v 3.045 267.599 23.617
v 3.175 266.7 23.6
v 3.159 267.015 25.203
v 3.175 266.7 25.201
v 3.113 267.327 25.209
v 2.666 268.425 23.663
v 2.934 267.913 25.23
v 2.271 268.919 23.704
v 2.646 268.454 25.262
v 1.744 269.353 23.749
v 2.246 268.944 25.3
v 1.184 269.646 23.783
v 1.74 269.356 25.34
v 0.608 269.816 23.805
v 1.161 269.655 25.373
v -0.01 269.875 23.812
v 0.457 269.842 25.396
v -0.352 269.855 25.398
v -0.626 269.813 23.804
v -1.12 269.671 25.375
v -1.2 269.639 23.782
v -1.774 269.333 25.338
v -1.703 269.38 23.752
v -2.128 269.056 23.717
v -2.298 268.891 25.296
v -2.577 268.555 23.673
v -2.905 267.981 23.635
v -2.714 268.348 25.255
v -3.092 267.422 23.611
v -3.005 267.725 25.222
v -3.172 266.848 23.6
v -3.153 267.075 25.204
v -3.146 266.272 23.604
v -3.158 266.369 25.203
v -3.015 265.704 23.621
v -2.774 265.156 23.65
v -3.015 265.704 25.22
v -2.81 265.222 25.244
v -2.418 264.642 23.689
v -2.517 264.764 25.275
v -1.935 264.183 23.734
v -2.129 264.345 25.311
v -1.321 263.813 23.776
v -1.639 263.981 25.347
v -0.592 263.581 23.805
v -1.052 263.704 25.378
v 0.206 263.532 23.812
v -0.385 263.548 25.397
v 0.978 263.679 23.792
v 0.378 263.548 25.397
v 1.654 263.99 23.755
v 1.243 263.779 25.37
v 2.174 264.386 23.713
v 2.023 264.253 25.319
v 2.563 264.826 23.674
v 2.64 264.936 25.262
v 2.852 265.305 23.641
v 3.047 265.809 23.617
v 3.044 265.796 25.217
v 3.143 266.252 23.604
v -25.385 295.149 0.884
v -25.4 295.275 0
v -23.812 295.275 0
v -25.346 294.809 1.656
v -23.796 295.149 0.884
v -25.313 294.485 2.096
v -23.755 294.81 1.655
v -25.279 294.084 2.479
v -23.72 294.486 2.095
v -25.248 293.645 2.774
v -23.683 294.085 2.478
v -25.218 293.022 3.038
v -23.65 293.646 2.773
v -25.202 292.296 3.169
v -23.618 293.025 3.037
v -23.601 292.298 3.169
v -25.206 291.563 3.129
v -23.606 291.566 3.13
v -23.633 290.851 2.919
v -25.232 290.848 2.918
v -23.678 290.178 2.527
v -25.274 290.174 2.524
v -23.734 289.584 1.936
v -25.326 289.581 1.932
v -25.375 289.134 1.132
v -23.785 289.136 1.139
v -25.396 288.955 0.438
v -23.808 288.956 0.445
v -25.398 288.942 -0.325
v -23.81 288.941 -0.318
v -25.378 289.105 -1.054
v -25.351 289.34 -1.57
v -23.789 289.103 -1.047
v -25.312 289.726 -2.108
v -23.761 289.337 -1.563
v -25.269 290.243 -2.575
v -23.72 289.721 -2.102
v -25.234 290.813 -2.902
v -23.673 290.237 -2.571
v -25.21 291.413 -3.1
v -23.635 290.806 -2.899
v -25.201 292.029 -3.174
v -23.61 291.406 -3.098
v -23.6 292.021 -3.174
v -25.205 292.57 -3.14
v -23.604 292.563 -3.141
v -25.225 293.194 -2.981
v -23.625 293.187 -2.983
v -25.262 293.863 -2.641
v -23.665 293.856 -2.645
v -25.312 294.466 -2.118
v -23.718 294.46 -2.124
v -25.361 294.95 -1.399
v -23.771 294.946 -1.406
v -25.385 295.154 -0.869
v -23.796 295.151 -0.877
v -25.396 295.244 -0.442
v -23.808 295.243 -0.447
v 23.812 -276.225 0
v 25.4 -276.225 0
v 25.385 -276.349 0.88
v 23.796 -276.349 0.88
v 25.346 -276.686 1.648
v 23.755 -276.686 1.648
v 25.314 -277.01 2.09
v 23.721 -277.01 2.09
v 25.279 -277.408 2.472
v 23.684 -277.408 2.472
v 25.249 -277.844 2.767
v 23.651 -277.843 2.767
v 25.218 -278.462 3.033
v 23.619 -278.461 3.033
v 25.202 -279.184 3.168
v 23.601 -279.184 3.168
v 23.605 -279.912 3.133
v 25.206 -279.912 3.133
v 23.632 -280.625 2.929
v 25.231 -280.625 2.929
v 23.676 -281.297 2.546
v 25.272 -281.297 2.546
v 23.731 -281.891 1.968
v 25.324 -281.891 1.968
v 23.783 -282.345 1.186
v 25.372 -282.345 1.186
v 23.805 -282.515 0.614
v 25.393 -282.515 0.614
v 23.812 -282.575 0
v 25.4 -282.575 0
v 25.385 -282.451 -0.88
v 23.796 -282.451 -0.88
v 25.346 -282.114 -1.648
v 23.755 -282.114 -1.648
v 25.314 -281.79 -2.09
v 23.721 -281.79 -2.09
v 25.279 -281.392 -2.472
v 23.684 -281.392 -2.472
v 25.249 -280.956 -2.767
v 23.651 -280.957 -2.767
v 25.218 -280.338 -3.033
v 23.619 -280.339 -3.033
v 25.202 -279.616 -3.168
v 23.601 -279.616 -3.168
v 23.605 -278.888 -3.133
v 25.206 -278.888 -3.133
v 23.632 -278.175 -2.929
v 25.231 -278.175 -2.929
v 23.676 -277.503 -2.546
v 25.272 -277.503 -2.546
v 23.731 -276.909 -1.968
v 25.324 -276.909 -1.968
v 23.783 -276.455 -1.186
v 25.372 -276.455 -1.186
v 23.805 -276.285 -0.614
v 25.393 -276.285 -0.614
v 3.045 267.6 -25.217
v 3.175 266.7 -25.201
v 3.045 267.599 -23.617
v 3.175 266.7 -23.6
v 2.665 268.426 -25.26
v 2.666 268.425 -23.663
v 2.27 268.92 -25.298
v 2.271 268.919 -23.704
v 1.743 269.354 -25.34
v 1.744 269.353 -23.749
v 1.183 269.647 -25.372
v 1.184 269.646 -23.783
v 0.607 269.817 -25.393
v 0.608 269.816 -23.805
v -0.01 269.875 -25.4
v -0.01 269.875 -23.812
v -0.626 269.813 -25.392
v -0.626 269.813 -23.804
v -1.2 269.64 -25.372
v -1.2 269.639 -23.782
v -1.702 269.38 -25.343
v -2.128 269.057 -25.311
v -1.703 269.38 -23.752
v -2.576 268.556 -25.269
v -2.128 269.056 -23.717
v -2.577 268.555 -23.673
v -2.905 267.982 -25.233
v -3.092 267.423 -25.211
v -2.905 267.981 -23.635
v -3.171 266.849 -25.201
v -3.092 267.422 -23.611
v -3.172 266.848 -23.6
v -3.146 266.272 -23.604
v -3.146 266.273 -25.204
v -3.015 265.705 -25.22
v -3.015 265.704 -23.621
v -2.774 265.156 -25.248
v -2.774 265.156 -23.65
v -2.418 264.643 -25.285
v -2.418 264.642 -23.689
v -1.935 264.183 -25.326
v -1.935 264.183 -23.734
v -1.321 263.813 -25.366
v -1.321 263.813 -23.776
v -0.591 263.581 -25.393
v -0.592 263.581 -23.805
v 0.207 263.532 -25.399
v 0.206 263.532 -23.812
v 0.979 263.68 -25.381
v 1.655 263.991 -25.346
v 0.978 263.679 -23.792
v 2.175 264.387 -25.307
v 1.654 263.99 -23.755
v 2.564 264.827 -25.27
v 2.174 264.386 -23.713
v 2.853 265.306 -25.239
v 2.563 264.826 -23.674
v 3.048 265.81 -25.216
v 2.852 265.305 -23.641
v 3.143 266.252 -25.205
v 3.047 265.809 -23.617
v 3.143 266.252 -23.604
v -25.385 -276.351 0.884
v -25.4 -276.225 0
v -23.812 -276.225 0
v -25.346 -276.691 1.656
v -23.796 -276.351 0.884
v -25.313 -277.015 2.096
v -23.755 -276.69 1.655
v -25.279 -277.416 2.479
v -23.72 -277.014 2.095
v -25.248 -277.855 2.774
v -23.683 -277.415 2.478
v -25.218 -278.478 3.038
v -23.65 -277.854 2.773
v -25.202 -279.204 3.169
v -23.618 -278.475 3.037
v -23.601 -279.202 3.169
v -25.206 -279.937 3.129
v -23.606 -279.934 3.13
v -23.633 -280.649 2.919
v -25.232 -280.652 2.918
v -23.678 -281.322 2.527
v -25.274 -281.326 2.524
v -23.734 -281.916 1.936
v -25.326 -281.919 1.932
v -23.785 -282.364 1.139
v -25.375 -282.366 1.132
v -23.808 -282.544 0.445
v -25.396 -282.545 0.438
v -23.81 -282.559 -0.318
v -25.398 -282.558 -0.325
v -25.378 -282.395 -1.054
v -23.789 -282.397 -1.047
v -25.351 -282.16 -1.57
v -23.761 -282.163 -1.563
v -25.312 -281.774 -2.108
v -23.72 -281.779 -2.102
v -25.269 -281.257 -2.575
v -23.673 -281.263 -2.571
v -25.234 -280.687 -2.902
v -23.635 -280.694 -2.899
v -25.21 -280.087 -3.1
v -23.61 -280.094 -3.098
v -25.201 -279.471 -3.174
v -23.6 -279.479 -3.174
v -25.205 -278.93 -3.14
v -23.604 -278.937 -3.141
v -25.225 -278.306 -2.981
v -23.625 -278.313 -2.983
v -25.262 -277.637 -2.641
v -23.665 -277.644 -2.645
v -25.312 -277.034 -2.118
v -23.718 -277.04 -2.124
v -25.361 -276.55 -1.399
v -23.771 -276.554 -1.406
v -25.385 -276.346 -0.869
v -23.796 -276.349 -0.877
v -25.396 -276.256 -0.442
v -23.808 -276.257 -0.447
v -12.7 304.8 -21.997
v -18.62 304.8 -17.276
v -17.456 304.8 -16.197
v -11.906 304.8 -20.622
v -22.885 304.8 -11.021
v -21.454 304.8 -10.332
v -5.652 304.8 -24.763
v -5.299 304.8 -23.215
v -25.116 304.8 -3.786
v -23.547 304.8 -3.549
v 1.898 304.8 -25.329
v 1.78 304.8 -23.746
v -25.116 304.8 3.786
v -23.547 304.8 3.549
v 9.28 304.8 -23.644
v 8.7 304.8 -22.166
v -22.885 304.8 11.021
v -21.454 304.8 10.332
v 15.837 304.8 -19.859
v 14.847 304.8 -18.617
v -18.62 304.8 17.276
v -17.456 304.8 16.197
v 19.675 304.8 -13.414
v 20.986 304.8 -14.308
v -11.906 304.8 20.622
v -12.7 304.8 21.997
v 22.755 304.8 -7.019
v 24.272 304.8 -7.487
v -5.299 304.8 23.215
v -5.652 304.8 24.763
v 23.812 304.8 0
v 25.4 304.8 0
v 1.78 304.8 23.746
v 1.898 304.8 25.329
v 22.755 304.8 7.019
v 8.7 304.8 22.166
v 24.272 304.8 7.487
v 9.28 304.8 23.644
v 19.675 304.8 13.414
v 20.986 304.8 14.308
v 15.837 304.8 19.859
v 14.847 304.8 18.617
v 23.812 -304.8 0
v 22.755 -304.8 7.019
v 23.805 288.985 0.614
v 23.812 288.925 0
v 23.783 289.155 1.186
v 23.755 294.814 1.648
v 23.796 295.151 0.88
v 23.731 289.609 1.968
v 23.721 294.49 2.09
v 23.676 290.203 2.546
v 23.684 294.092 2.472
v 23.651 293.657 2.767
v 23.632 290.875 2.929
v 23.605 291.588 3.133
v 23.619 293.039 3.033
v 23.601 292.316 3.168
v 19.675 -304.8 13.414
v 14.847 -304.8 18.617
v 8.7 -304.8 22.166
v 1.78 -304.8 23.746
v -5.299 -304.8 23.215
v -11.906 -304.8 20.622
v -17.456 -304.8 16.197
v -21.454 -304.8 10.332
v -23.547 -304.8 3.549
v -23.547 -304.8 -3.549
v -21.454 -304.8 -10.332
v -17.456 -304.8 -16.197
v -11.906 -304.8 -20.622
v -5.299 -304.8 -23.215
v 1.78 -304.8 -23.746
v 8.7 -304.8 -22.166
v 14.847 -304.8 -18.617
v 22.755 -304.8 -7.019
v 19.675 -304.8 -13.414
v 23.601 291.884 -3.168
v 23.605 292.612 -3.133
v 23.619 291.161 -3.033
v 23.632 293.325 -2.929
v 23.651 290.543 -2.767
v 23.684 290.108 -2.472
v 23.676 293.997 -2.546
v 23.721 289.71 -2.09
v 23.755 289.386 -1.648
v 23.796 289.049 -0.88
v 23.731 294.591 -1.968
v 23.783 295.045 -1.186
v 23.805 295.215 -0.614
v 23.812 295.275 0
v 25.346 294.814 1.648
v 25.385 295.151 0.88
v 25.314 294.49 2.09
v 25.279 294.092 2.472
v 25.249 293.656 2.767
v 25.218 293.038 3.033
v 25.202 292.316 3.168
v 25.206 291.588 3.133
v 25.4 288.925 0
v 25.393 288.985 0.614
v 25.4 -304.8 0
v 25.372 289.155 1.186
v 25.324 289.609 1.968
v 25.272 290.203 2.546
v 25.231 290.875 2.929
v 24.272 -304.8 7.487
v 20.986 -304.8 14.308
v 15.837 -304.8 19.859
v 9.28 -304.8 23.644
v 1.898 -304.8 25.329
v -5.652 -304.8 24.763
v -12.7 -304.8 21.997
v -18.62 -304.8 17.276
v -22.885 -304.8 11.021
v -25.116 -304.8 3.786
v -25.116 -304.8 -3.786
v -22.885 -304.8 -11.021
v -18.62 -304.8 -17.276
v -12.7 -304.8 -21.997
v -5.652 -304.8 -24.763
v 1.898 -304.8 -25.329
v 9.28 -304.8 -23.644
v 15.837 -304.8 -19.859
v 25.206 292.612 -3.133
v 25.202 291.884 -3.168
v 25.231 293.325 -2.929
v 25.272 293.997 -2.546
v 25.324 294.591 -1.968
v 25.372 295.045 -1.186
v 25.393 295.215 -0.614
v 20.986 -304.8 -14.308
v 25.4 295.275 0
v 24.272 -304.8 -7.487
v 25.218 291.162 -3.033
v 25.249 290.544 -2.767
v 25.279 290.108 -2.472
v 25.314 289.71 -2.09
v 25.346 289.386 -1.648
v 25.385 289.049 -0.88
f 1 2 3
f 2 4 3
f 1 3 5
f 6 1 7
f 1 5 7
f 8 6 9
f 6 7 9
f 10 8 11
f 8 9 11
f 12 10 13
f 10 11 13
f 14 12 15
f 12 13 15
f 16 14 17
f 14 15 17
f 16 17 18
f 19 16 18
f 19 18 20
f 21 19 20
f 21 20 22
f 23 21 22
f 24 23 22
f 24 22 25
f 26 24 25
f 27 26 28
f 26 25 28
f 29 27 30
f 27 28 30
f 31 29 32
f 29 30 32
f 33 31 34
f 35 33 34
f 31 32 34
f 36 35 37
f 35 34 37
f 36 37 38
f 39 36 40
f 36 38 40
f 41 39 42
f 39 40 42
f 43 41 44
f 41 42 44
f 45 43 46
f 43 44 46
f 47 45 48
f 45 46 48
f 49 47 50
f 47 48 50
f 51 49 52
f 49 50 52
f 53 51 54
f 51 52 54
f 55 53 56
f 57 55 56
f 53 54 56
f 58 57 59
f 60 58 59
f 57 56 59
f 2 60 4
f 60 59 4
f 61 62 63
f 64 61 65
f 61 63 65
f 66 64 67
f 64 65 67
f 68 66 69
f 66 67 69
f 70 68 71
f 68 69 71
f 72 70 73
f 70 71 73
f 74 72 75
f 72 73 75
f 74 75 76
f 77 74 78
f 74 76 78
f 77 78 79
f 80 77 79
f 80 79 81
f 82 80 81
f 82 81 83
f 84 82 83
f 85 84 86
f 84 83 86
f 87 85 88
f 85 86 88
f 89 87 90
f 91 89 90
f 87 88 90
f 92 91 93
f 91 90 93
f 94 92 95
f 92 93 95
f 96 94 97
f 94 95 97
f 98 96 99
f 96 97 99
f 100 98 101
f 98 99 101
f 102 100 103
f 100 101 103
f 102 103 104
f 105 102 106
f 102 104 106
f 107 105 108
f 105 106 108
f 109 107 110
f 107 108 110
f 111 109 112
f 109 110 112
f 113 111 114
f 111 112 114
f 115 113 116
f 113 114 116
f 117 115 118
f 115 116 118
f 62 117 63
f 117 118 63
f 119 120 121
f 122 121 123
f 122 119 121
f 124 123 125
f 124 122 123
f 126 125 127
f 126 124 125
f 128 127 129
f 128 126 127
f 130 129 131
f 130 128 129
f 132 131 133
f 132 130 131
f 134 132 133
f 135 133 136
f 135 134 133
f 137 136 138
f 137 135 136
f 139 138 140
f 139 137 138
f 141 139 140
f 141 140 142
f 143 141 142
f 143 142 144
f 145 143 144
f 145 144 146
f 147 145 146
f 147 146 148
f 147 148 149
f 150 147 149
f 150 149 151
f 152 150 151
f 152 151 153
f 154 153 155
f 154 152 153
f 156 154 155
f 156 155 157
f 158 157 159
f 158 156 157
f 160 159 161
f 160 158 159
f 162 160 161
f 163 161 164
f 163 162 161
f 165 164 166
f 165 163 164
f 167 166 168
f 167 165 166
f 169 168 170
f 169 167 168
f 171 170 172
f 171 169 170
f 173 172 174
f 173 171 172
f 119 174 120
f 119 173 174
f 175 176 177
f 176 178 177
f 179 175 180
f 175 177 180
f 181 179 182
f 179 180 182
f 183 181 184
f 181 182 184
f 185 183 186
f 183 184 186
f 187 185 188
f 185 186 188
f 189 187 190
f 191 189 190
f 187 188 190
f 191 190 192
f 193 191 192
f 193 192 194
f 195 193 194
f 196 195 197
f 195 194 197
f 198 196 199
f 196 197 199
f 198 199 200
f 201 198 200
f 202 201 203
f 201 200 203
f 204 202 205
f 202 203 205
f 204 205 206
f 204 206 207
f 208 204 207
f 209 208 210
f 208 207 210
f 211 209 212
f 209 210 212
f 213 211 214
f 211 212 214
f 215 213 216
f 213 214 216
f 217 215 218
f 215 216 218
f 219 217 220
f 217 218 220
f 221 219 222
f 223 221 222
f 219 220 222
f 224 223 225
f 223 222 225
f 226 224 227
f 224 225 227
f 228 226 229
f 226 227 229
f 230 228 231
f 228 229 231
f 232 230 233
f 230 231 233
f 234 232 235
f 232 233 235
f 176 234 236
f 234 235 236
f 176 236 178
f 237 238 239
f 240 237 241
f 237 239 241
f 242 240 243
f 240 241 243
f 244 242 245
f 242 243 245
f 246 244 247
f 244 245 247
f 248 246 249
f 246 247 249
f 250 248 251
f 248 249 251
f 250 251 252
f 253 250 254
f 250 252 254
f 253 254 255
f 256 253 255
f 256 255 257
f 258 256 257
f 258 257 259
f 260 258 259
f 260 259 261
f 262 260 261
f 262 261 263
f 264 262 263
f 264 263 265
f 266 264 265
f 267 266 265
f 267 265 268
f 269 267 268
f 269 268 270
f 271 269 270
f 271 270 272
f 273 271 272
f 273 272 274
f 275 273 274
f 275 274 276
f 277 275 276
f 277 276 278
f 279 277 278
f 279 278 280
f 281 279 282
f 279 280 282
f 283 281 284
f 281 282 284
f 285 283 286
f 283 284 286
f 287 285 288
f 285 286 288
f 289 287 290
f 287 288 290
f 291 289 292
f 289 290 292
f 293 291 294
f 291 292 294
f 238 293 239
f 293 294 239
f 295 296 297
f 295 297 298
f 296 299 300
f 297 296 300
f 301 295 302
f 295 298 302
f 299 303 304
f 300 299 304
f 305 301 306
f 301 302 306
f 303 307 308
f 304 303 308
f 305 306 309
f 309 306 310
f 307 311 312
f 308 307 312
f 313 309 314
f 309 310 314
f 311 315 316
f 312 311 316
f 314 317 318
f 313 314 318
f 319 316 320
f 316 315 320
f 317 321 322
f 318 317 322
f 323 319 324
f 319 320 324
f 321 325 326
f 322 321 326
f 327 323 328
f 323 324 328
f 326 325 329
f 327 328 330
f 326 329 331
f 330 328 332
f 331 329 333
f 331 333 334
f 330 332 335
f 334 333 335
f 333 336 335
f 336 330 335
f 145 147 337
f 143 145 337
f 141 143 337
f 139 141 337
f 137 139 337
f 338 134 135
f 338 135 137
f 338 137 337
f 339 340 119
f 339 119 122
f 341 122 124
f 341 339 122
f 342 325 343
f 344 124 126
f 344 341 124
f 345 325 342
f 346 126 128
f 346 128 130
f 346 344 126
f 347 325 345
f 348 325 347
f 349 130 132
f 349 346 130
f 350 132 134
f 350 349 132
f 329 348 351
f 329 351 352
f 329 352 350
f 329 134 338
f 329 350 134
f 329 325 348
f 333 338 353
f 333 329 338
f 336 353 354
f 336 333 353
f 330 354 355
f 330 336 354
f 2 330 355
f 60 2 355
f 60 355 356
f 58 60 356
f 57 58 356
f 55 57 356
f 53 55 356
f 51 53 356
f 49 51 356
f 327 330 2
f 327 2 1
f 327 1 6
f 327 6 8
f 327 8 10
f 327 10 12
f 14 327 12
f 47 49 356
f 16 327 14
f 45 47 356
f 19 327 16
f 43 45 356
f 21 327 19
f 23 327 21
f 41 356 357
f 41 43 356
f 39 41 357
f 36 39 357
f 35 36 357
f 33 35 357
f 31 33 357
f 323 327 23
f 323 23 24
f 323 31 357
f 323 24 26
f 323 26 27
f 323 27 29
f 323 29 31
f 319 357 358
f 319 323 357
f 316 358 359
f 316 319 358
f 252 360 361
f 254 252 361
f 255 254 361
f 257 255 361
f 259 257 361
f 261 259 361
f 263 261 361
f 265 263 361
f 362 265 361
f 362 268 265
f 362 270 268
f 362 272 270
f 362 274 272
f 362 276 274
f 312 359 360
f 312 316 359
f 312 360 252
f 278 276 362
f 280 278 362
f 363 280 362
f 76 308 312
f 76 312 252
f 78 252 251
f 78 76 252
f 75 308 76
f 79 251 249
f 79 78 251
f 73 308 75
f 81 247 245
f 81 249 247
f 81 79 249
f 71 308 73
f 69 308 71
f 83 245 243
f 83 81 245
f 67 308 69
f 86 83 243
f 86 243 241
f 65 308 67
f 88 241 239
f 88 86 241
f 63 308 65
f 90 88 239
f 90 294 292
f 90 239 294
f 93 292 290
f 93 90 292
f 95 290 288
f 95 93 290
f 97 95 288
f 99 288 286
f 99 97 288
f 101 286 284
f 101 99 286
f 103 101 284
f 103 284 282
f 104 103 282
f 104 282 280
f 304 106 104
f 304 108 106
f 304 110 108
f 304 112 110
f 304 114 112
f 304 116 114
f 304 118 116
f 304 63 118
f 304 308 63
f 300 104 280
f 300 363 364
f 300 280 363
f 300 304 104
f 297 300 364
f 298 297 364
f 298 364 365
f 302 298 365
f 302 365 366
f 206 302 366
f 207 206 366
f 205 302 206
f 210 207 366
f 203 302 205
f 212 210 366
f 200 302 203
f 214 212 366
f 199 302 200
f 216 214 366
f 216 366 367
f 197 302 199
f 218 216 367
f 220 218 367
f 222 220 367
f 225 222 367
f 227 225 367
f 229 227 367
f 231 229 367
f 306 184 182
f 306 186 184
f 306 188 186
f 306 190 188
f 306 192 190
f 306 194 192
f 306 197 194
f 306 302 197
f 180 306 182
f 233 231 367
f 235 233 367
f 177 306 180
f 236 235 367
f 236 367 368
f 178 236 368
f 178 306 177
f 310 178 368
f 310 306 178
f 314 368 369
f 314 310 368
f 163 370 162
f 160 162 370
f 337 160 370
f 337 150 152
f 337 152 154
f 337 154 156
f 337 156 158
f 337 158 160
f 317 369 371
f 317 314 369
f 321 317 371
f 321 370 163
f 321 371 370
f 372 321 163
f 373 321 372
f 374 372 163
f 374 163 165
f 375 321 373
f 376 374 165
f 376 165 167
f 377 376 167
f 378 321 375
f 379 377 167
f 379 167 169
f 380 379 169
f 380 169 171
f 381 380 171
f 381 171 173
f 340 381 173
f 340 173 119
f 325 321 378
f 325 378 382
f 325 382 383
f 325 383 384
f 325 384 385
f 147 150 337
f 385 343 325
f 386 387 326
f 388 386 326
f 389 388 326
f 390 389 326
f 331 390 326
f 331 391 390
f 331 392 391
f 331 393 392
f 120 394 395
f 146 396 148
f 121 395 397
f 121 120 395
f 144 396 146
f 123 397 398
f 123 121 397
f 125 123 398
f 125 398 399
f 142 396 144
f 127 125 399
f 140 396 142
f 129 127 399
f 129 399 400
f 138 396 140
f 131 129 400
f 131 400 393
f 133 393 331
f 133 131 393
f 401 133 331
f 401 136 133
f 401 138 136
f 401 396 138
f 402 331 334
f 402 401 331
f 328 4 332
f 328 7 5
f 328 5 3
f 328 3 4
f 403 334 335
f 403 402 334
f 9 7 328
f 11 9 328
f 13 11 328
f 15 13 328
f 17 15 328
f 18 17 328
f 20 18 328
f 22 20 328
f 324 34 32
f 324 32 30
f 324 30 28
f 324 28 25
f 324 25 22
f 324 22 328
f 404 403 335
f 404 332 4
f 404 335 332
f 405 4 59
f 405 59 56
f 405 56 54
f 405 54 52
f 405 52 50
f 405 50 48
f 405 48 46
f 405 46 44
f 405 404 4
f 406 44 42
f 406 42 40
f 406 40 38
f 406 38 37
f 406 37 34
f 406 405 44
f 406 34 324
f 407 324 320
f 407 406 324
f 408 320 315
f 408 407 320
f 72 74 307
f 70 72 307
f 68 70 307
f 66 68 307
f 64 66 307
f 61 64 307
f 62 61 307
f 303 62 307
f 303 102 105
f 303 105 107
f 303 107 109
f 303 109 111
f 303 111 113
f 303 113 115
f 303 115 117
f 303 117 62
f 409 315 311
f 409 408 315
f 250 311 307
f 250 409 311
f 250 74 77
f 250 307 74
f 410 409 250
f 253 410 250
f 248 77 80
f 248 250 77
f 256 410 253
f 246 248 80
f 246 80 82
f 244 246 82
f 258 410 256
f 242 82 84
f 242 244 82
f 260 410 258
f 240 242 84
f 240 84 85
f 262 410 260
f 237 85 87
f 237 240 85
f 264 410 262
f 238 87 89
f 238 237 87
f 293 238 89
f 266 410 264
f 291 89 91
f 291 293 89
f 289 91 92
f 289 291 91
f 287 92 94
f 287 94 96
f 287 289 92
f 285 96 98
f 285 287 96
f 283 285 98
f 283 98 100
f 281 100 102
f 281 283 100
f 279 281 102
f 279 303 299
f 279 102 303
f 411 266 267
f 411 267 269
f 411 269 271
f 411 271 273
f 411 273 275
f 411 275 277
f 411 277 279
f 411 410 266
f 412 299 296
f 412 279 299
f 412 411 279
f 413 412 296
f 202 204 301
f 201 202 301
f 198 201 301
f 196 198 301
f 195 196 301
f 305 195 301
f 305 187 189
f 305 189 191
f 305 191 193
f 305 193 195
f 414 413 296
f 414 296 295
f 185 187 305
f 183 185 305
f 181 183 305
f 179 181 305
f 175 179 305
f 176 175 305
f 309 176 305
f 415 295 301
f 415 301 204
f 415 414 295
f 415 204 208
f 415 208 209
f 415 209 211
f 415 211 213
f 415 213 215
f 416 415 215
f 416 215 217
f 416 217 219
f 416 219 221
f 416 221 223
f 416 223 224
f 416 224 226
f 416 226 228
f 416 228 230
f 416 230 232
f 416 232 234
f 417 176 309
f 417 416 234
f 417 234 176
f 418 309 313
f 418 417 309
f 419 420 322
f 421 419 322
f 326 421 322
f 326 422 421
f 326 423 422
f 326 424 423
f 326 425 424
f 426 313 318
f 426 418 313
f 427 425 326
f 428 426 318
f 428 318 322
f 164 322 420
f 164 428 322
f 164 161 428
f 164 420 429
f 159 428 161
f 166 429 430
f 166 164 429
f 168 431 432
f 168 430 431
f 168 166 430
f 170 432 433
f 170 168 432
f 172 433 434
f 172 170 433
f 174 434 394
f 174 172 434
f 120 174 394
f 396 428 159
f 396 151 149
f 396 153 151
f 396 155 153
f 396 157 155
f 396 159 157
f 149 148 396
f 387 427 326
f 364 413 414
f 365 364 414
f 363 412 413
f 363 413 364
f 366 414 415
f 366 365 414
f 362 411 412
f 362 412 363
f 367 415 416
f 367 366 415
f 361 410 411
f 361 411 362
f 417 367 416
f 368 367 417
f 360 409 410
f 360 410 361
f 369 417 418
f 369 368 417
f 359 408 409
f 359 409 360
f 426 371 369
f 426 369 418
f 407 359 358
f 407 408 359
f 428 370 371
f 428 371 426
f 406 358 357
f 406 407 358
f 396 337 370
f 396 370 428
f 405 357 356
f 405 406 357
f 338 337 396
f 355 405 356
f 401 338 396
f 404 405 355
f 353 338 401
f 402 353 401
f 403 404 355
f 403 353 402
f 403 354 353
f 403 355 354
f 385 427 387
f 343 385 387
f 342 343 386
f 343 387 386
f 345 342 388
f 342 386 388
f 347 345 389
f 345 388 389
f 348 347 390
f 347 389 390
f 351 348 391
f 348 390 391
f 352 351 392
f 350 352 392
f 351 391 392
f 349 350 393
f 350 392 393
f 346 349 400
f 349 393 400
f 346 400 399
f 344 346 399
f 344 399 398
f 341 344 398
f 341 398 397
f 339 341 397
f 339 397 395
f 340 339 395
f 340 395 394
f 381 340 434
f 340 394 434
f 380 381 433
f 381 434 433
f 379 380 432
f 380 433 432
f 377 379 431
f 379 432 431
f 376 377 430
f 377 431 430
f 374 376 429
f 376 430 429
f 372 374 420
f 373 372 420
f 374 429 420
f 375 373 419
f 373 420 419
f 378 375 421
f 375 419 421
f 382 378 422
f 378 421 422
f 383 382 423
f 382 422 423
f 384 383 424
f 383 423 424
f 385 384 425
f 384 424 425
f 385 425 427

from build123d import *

# Parameters (mm, degrees)
F0_R     = 25.4
F0_R_2   = 23.8125
F1_DEPTH = 304.8
F2_R     = 3.175
F3_DEPTH = 25.4
F4_R     = 3.175
F5_DEPTH = 25.4


with BuildPart() as f1:
    # F0 (on Front) → F1 (new body, symmetric)
    with BuildSketch(Plane.XZ):
        Circle(F0_R)
        Circle(F0_R_2, mode=Mode.SUBTRACT)
    extrude(amount=F1_DEPTH, both=True)

    # F2 (on Right) → F3 (cut, symmetric)
    with BuildSketch(Plane.YZ):
        with Locations((-279.4, 0)):
            Circle(F2_R)
        with Locations((292.1, 0)):
            Circle(F2_R)
    extrude(amount=F3_DEPTH, both=True, mode=Mode.SUBTRACT)

    # F4 (on Top) → F5 (cut, symmetric)
    with BuildSketch(Plane.XY):
        with Locations((0, 266.7)):
            Circle(F4_R)
    extrude(amount=F5_DEPTH, both=True, mode=Mode.SUBTRACT)


solid = f1.part
